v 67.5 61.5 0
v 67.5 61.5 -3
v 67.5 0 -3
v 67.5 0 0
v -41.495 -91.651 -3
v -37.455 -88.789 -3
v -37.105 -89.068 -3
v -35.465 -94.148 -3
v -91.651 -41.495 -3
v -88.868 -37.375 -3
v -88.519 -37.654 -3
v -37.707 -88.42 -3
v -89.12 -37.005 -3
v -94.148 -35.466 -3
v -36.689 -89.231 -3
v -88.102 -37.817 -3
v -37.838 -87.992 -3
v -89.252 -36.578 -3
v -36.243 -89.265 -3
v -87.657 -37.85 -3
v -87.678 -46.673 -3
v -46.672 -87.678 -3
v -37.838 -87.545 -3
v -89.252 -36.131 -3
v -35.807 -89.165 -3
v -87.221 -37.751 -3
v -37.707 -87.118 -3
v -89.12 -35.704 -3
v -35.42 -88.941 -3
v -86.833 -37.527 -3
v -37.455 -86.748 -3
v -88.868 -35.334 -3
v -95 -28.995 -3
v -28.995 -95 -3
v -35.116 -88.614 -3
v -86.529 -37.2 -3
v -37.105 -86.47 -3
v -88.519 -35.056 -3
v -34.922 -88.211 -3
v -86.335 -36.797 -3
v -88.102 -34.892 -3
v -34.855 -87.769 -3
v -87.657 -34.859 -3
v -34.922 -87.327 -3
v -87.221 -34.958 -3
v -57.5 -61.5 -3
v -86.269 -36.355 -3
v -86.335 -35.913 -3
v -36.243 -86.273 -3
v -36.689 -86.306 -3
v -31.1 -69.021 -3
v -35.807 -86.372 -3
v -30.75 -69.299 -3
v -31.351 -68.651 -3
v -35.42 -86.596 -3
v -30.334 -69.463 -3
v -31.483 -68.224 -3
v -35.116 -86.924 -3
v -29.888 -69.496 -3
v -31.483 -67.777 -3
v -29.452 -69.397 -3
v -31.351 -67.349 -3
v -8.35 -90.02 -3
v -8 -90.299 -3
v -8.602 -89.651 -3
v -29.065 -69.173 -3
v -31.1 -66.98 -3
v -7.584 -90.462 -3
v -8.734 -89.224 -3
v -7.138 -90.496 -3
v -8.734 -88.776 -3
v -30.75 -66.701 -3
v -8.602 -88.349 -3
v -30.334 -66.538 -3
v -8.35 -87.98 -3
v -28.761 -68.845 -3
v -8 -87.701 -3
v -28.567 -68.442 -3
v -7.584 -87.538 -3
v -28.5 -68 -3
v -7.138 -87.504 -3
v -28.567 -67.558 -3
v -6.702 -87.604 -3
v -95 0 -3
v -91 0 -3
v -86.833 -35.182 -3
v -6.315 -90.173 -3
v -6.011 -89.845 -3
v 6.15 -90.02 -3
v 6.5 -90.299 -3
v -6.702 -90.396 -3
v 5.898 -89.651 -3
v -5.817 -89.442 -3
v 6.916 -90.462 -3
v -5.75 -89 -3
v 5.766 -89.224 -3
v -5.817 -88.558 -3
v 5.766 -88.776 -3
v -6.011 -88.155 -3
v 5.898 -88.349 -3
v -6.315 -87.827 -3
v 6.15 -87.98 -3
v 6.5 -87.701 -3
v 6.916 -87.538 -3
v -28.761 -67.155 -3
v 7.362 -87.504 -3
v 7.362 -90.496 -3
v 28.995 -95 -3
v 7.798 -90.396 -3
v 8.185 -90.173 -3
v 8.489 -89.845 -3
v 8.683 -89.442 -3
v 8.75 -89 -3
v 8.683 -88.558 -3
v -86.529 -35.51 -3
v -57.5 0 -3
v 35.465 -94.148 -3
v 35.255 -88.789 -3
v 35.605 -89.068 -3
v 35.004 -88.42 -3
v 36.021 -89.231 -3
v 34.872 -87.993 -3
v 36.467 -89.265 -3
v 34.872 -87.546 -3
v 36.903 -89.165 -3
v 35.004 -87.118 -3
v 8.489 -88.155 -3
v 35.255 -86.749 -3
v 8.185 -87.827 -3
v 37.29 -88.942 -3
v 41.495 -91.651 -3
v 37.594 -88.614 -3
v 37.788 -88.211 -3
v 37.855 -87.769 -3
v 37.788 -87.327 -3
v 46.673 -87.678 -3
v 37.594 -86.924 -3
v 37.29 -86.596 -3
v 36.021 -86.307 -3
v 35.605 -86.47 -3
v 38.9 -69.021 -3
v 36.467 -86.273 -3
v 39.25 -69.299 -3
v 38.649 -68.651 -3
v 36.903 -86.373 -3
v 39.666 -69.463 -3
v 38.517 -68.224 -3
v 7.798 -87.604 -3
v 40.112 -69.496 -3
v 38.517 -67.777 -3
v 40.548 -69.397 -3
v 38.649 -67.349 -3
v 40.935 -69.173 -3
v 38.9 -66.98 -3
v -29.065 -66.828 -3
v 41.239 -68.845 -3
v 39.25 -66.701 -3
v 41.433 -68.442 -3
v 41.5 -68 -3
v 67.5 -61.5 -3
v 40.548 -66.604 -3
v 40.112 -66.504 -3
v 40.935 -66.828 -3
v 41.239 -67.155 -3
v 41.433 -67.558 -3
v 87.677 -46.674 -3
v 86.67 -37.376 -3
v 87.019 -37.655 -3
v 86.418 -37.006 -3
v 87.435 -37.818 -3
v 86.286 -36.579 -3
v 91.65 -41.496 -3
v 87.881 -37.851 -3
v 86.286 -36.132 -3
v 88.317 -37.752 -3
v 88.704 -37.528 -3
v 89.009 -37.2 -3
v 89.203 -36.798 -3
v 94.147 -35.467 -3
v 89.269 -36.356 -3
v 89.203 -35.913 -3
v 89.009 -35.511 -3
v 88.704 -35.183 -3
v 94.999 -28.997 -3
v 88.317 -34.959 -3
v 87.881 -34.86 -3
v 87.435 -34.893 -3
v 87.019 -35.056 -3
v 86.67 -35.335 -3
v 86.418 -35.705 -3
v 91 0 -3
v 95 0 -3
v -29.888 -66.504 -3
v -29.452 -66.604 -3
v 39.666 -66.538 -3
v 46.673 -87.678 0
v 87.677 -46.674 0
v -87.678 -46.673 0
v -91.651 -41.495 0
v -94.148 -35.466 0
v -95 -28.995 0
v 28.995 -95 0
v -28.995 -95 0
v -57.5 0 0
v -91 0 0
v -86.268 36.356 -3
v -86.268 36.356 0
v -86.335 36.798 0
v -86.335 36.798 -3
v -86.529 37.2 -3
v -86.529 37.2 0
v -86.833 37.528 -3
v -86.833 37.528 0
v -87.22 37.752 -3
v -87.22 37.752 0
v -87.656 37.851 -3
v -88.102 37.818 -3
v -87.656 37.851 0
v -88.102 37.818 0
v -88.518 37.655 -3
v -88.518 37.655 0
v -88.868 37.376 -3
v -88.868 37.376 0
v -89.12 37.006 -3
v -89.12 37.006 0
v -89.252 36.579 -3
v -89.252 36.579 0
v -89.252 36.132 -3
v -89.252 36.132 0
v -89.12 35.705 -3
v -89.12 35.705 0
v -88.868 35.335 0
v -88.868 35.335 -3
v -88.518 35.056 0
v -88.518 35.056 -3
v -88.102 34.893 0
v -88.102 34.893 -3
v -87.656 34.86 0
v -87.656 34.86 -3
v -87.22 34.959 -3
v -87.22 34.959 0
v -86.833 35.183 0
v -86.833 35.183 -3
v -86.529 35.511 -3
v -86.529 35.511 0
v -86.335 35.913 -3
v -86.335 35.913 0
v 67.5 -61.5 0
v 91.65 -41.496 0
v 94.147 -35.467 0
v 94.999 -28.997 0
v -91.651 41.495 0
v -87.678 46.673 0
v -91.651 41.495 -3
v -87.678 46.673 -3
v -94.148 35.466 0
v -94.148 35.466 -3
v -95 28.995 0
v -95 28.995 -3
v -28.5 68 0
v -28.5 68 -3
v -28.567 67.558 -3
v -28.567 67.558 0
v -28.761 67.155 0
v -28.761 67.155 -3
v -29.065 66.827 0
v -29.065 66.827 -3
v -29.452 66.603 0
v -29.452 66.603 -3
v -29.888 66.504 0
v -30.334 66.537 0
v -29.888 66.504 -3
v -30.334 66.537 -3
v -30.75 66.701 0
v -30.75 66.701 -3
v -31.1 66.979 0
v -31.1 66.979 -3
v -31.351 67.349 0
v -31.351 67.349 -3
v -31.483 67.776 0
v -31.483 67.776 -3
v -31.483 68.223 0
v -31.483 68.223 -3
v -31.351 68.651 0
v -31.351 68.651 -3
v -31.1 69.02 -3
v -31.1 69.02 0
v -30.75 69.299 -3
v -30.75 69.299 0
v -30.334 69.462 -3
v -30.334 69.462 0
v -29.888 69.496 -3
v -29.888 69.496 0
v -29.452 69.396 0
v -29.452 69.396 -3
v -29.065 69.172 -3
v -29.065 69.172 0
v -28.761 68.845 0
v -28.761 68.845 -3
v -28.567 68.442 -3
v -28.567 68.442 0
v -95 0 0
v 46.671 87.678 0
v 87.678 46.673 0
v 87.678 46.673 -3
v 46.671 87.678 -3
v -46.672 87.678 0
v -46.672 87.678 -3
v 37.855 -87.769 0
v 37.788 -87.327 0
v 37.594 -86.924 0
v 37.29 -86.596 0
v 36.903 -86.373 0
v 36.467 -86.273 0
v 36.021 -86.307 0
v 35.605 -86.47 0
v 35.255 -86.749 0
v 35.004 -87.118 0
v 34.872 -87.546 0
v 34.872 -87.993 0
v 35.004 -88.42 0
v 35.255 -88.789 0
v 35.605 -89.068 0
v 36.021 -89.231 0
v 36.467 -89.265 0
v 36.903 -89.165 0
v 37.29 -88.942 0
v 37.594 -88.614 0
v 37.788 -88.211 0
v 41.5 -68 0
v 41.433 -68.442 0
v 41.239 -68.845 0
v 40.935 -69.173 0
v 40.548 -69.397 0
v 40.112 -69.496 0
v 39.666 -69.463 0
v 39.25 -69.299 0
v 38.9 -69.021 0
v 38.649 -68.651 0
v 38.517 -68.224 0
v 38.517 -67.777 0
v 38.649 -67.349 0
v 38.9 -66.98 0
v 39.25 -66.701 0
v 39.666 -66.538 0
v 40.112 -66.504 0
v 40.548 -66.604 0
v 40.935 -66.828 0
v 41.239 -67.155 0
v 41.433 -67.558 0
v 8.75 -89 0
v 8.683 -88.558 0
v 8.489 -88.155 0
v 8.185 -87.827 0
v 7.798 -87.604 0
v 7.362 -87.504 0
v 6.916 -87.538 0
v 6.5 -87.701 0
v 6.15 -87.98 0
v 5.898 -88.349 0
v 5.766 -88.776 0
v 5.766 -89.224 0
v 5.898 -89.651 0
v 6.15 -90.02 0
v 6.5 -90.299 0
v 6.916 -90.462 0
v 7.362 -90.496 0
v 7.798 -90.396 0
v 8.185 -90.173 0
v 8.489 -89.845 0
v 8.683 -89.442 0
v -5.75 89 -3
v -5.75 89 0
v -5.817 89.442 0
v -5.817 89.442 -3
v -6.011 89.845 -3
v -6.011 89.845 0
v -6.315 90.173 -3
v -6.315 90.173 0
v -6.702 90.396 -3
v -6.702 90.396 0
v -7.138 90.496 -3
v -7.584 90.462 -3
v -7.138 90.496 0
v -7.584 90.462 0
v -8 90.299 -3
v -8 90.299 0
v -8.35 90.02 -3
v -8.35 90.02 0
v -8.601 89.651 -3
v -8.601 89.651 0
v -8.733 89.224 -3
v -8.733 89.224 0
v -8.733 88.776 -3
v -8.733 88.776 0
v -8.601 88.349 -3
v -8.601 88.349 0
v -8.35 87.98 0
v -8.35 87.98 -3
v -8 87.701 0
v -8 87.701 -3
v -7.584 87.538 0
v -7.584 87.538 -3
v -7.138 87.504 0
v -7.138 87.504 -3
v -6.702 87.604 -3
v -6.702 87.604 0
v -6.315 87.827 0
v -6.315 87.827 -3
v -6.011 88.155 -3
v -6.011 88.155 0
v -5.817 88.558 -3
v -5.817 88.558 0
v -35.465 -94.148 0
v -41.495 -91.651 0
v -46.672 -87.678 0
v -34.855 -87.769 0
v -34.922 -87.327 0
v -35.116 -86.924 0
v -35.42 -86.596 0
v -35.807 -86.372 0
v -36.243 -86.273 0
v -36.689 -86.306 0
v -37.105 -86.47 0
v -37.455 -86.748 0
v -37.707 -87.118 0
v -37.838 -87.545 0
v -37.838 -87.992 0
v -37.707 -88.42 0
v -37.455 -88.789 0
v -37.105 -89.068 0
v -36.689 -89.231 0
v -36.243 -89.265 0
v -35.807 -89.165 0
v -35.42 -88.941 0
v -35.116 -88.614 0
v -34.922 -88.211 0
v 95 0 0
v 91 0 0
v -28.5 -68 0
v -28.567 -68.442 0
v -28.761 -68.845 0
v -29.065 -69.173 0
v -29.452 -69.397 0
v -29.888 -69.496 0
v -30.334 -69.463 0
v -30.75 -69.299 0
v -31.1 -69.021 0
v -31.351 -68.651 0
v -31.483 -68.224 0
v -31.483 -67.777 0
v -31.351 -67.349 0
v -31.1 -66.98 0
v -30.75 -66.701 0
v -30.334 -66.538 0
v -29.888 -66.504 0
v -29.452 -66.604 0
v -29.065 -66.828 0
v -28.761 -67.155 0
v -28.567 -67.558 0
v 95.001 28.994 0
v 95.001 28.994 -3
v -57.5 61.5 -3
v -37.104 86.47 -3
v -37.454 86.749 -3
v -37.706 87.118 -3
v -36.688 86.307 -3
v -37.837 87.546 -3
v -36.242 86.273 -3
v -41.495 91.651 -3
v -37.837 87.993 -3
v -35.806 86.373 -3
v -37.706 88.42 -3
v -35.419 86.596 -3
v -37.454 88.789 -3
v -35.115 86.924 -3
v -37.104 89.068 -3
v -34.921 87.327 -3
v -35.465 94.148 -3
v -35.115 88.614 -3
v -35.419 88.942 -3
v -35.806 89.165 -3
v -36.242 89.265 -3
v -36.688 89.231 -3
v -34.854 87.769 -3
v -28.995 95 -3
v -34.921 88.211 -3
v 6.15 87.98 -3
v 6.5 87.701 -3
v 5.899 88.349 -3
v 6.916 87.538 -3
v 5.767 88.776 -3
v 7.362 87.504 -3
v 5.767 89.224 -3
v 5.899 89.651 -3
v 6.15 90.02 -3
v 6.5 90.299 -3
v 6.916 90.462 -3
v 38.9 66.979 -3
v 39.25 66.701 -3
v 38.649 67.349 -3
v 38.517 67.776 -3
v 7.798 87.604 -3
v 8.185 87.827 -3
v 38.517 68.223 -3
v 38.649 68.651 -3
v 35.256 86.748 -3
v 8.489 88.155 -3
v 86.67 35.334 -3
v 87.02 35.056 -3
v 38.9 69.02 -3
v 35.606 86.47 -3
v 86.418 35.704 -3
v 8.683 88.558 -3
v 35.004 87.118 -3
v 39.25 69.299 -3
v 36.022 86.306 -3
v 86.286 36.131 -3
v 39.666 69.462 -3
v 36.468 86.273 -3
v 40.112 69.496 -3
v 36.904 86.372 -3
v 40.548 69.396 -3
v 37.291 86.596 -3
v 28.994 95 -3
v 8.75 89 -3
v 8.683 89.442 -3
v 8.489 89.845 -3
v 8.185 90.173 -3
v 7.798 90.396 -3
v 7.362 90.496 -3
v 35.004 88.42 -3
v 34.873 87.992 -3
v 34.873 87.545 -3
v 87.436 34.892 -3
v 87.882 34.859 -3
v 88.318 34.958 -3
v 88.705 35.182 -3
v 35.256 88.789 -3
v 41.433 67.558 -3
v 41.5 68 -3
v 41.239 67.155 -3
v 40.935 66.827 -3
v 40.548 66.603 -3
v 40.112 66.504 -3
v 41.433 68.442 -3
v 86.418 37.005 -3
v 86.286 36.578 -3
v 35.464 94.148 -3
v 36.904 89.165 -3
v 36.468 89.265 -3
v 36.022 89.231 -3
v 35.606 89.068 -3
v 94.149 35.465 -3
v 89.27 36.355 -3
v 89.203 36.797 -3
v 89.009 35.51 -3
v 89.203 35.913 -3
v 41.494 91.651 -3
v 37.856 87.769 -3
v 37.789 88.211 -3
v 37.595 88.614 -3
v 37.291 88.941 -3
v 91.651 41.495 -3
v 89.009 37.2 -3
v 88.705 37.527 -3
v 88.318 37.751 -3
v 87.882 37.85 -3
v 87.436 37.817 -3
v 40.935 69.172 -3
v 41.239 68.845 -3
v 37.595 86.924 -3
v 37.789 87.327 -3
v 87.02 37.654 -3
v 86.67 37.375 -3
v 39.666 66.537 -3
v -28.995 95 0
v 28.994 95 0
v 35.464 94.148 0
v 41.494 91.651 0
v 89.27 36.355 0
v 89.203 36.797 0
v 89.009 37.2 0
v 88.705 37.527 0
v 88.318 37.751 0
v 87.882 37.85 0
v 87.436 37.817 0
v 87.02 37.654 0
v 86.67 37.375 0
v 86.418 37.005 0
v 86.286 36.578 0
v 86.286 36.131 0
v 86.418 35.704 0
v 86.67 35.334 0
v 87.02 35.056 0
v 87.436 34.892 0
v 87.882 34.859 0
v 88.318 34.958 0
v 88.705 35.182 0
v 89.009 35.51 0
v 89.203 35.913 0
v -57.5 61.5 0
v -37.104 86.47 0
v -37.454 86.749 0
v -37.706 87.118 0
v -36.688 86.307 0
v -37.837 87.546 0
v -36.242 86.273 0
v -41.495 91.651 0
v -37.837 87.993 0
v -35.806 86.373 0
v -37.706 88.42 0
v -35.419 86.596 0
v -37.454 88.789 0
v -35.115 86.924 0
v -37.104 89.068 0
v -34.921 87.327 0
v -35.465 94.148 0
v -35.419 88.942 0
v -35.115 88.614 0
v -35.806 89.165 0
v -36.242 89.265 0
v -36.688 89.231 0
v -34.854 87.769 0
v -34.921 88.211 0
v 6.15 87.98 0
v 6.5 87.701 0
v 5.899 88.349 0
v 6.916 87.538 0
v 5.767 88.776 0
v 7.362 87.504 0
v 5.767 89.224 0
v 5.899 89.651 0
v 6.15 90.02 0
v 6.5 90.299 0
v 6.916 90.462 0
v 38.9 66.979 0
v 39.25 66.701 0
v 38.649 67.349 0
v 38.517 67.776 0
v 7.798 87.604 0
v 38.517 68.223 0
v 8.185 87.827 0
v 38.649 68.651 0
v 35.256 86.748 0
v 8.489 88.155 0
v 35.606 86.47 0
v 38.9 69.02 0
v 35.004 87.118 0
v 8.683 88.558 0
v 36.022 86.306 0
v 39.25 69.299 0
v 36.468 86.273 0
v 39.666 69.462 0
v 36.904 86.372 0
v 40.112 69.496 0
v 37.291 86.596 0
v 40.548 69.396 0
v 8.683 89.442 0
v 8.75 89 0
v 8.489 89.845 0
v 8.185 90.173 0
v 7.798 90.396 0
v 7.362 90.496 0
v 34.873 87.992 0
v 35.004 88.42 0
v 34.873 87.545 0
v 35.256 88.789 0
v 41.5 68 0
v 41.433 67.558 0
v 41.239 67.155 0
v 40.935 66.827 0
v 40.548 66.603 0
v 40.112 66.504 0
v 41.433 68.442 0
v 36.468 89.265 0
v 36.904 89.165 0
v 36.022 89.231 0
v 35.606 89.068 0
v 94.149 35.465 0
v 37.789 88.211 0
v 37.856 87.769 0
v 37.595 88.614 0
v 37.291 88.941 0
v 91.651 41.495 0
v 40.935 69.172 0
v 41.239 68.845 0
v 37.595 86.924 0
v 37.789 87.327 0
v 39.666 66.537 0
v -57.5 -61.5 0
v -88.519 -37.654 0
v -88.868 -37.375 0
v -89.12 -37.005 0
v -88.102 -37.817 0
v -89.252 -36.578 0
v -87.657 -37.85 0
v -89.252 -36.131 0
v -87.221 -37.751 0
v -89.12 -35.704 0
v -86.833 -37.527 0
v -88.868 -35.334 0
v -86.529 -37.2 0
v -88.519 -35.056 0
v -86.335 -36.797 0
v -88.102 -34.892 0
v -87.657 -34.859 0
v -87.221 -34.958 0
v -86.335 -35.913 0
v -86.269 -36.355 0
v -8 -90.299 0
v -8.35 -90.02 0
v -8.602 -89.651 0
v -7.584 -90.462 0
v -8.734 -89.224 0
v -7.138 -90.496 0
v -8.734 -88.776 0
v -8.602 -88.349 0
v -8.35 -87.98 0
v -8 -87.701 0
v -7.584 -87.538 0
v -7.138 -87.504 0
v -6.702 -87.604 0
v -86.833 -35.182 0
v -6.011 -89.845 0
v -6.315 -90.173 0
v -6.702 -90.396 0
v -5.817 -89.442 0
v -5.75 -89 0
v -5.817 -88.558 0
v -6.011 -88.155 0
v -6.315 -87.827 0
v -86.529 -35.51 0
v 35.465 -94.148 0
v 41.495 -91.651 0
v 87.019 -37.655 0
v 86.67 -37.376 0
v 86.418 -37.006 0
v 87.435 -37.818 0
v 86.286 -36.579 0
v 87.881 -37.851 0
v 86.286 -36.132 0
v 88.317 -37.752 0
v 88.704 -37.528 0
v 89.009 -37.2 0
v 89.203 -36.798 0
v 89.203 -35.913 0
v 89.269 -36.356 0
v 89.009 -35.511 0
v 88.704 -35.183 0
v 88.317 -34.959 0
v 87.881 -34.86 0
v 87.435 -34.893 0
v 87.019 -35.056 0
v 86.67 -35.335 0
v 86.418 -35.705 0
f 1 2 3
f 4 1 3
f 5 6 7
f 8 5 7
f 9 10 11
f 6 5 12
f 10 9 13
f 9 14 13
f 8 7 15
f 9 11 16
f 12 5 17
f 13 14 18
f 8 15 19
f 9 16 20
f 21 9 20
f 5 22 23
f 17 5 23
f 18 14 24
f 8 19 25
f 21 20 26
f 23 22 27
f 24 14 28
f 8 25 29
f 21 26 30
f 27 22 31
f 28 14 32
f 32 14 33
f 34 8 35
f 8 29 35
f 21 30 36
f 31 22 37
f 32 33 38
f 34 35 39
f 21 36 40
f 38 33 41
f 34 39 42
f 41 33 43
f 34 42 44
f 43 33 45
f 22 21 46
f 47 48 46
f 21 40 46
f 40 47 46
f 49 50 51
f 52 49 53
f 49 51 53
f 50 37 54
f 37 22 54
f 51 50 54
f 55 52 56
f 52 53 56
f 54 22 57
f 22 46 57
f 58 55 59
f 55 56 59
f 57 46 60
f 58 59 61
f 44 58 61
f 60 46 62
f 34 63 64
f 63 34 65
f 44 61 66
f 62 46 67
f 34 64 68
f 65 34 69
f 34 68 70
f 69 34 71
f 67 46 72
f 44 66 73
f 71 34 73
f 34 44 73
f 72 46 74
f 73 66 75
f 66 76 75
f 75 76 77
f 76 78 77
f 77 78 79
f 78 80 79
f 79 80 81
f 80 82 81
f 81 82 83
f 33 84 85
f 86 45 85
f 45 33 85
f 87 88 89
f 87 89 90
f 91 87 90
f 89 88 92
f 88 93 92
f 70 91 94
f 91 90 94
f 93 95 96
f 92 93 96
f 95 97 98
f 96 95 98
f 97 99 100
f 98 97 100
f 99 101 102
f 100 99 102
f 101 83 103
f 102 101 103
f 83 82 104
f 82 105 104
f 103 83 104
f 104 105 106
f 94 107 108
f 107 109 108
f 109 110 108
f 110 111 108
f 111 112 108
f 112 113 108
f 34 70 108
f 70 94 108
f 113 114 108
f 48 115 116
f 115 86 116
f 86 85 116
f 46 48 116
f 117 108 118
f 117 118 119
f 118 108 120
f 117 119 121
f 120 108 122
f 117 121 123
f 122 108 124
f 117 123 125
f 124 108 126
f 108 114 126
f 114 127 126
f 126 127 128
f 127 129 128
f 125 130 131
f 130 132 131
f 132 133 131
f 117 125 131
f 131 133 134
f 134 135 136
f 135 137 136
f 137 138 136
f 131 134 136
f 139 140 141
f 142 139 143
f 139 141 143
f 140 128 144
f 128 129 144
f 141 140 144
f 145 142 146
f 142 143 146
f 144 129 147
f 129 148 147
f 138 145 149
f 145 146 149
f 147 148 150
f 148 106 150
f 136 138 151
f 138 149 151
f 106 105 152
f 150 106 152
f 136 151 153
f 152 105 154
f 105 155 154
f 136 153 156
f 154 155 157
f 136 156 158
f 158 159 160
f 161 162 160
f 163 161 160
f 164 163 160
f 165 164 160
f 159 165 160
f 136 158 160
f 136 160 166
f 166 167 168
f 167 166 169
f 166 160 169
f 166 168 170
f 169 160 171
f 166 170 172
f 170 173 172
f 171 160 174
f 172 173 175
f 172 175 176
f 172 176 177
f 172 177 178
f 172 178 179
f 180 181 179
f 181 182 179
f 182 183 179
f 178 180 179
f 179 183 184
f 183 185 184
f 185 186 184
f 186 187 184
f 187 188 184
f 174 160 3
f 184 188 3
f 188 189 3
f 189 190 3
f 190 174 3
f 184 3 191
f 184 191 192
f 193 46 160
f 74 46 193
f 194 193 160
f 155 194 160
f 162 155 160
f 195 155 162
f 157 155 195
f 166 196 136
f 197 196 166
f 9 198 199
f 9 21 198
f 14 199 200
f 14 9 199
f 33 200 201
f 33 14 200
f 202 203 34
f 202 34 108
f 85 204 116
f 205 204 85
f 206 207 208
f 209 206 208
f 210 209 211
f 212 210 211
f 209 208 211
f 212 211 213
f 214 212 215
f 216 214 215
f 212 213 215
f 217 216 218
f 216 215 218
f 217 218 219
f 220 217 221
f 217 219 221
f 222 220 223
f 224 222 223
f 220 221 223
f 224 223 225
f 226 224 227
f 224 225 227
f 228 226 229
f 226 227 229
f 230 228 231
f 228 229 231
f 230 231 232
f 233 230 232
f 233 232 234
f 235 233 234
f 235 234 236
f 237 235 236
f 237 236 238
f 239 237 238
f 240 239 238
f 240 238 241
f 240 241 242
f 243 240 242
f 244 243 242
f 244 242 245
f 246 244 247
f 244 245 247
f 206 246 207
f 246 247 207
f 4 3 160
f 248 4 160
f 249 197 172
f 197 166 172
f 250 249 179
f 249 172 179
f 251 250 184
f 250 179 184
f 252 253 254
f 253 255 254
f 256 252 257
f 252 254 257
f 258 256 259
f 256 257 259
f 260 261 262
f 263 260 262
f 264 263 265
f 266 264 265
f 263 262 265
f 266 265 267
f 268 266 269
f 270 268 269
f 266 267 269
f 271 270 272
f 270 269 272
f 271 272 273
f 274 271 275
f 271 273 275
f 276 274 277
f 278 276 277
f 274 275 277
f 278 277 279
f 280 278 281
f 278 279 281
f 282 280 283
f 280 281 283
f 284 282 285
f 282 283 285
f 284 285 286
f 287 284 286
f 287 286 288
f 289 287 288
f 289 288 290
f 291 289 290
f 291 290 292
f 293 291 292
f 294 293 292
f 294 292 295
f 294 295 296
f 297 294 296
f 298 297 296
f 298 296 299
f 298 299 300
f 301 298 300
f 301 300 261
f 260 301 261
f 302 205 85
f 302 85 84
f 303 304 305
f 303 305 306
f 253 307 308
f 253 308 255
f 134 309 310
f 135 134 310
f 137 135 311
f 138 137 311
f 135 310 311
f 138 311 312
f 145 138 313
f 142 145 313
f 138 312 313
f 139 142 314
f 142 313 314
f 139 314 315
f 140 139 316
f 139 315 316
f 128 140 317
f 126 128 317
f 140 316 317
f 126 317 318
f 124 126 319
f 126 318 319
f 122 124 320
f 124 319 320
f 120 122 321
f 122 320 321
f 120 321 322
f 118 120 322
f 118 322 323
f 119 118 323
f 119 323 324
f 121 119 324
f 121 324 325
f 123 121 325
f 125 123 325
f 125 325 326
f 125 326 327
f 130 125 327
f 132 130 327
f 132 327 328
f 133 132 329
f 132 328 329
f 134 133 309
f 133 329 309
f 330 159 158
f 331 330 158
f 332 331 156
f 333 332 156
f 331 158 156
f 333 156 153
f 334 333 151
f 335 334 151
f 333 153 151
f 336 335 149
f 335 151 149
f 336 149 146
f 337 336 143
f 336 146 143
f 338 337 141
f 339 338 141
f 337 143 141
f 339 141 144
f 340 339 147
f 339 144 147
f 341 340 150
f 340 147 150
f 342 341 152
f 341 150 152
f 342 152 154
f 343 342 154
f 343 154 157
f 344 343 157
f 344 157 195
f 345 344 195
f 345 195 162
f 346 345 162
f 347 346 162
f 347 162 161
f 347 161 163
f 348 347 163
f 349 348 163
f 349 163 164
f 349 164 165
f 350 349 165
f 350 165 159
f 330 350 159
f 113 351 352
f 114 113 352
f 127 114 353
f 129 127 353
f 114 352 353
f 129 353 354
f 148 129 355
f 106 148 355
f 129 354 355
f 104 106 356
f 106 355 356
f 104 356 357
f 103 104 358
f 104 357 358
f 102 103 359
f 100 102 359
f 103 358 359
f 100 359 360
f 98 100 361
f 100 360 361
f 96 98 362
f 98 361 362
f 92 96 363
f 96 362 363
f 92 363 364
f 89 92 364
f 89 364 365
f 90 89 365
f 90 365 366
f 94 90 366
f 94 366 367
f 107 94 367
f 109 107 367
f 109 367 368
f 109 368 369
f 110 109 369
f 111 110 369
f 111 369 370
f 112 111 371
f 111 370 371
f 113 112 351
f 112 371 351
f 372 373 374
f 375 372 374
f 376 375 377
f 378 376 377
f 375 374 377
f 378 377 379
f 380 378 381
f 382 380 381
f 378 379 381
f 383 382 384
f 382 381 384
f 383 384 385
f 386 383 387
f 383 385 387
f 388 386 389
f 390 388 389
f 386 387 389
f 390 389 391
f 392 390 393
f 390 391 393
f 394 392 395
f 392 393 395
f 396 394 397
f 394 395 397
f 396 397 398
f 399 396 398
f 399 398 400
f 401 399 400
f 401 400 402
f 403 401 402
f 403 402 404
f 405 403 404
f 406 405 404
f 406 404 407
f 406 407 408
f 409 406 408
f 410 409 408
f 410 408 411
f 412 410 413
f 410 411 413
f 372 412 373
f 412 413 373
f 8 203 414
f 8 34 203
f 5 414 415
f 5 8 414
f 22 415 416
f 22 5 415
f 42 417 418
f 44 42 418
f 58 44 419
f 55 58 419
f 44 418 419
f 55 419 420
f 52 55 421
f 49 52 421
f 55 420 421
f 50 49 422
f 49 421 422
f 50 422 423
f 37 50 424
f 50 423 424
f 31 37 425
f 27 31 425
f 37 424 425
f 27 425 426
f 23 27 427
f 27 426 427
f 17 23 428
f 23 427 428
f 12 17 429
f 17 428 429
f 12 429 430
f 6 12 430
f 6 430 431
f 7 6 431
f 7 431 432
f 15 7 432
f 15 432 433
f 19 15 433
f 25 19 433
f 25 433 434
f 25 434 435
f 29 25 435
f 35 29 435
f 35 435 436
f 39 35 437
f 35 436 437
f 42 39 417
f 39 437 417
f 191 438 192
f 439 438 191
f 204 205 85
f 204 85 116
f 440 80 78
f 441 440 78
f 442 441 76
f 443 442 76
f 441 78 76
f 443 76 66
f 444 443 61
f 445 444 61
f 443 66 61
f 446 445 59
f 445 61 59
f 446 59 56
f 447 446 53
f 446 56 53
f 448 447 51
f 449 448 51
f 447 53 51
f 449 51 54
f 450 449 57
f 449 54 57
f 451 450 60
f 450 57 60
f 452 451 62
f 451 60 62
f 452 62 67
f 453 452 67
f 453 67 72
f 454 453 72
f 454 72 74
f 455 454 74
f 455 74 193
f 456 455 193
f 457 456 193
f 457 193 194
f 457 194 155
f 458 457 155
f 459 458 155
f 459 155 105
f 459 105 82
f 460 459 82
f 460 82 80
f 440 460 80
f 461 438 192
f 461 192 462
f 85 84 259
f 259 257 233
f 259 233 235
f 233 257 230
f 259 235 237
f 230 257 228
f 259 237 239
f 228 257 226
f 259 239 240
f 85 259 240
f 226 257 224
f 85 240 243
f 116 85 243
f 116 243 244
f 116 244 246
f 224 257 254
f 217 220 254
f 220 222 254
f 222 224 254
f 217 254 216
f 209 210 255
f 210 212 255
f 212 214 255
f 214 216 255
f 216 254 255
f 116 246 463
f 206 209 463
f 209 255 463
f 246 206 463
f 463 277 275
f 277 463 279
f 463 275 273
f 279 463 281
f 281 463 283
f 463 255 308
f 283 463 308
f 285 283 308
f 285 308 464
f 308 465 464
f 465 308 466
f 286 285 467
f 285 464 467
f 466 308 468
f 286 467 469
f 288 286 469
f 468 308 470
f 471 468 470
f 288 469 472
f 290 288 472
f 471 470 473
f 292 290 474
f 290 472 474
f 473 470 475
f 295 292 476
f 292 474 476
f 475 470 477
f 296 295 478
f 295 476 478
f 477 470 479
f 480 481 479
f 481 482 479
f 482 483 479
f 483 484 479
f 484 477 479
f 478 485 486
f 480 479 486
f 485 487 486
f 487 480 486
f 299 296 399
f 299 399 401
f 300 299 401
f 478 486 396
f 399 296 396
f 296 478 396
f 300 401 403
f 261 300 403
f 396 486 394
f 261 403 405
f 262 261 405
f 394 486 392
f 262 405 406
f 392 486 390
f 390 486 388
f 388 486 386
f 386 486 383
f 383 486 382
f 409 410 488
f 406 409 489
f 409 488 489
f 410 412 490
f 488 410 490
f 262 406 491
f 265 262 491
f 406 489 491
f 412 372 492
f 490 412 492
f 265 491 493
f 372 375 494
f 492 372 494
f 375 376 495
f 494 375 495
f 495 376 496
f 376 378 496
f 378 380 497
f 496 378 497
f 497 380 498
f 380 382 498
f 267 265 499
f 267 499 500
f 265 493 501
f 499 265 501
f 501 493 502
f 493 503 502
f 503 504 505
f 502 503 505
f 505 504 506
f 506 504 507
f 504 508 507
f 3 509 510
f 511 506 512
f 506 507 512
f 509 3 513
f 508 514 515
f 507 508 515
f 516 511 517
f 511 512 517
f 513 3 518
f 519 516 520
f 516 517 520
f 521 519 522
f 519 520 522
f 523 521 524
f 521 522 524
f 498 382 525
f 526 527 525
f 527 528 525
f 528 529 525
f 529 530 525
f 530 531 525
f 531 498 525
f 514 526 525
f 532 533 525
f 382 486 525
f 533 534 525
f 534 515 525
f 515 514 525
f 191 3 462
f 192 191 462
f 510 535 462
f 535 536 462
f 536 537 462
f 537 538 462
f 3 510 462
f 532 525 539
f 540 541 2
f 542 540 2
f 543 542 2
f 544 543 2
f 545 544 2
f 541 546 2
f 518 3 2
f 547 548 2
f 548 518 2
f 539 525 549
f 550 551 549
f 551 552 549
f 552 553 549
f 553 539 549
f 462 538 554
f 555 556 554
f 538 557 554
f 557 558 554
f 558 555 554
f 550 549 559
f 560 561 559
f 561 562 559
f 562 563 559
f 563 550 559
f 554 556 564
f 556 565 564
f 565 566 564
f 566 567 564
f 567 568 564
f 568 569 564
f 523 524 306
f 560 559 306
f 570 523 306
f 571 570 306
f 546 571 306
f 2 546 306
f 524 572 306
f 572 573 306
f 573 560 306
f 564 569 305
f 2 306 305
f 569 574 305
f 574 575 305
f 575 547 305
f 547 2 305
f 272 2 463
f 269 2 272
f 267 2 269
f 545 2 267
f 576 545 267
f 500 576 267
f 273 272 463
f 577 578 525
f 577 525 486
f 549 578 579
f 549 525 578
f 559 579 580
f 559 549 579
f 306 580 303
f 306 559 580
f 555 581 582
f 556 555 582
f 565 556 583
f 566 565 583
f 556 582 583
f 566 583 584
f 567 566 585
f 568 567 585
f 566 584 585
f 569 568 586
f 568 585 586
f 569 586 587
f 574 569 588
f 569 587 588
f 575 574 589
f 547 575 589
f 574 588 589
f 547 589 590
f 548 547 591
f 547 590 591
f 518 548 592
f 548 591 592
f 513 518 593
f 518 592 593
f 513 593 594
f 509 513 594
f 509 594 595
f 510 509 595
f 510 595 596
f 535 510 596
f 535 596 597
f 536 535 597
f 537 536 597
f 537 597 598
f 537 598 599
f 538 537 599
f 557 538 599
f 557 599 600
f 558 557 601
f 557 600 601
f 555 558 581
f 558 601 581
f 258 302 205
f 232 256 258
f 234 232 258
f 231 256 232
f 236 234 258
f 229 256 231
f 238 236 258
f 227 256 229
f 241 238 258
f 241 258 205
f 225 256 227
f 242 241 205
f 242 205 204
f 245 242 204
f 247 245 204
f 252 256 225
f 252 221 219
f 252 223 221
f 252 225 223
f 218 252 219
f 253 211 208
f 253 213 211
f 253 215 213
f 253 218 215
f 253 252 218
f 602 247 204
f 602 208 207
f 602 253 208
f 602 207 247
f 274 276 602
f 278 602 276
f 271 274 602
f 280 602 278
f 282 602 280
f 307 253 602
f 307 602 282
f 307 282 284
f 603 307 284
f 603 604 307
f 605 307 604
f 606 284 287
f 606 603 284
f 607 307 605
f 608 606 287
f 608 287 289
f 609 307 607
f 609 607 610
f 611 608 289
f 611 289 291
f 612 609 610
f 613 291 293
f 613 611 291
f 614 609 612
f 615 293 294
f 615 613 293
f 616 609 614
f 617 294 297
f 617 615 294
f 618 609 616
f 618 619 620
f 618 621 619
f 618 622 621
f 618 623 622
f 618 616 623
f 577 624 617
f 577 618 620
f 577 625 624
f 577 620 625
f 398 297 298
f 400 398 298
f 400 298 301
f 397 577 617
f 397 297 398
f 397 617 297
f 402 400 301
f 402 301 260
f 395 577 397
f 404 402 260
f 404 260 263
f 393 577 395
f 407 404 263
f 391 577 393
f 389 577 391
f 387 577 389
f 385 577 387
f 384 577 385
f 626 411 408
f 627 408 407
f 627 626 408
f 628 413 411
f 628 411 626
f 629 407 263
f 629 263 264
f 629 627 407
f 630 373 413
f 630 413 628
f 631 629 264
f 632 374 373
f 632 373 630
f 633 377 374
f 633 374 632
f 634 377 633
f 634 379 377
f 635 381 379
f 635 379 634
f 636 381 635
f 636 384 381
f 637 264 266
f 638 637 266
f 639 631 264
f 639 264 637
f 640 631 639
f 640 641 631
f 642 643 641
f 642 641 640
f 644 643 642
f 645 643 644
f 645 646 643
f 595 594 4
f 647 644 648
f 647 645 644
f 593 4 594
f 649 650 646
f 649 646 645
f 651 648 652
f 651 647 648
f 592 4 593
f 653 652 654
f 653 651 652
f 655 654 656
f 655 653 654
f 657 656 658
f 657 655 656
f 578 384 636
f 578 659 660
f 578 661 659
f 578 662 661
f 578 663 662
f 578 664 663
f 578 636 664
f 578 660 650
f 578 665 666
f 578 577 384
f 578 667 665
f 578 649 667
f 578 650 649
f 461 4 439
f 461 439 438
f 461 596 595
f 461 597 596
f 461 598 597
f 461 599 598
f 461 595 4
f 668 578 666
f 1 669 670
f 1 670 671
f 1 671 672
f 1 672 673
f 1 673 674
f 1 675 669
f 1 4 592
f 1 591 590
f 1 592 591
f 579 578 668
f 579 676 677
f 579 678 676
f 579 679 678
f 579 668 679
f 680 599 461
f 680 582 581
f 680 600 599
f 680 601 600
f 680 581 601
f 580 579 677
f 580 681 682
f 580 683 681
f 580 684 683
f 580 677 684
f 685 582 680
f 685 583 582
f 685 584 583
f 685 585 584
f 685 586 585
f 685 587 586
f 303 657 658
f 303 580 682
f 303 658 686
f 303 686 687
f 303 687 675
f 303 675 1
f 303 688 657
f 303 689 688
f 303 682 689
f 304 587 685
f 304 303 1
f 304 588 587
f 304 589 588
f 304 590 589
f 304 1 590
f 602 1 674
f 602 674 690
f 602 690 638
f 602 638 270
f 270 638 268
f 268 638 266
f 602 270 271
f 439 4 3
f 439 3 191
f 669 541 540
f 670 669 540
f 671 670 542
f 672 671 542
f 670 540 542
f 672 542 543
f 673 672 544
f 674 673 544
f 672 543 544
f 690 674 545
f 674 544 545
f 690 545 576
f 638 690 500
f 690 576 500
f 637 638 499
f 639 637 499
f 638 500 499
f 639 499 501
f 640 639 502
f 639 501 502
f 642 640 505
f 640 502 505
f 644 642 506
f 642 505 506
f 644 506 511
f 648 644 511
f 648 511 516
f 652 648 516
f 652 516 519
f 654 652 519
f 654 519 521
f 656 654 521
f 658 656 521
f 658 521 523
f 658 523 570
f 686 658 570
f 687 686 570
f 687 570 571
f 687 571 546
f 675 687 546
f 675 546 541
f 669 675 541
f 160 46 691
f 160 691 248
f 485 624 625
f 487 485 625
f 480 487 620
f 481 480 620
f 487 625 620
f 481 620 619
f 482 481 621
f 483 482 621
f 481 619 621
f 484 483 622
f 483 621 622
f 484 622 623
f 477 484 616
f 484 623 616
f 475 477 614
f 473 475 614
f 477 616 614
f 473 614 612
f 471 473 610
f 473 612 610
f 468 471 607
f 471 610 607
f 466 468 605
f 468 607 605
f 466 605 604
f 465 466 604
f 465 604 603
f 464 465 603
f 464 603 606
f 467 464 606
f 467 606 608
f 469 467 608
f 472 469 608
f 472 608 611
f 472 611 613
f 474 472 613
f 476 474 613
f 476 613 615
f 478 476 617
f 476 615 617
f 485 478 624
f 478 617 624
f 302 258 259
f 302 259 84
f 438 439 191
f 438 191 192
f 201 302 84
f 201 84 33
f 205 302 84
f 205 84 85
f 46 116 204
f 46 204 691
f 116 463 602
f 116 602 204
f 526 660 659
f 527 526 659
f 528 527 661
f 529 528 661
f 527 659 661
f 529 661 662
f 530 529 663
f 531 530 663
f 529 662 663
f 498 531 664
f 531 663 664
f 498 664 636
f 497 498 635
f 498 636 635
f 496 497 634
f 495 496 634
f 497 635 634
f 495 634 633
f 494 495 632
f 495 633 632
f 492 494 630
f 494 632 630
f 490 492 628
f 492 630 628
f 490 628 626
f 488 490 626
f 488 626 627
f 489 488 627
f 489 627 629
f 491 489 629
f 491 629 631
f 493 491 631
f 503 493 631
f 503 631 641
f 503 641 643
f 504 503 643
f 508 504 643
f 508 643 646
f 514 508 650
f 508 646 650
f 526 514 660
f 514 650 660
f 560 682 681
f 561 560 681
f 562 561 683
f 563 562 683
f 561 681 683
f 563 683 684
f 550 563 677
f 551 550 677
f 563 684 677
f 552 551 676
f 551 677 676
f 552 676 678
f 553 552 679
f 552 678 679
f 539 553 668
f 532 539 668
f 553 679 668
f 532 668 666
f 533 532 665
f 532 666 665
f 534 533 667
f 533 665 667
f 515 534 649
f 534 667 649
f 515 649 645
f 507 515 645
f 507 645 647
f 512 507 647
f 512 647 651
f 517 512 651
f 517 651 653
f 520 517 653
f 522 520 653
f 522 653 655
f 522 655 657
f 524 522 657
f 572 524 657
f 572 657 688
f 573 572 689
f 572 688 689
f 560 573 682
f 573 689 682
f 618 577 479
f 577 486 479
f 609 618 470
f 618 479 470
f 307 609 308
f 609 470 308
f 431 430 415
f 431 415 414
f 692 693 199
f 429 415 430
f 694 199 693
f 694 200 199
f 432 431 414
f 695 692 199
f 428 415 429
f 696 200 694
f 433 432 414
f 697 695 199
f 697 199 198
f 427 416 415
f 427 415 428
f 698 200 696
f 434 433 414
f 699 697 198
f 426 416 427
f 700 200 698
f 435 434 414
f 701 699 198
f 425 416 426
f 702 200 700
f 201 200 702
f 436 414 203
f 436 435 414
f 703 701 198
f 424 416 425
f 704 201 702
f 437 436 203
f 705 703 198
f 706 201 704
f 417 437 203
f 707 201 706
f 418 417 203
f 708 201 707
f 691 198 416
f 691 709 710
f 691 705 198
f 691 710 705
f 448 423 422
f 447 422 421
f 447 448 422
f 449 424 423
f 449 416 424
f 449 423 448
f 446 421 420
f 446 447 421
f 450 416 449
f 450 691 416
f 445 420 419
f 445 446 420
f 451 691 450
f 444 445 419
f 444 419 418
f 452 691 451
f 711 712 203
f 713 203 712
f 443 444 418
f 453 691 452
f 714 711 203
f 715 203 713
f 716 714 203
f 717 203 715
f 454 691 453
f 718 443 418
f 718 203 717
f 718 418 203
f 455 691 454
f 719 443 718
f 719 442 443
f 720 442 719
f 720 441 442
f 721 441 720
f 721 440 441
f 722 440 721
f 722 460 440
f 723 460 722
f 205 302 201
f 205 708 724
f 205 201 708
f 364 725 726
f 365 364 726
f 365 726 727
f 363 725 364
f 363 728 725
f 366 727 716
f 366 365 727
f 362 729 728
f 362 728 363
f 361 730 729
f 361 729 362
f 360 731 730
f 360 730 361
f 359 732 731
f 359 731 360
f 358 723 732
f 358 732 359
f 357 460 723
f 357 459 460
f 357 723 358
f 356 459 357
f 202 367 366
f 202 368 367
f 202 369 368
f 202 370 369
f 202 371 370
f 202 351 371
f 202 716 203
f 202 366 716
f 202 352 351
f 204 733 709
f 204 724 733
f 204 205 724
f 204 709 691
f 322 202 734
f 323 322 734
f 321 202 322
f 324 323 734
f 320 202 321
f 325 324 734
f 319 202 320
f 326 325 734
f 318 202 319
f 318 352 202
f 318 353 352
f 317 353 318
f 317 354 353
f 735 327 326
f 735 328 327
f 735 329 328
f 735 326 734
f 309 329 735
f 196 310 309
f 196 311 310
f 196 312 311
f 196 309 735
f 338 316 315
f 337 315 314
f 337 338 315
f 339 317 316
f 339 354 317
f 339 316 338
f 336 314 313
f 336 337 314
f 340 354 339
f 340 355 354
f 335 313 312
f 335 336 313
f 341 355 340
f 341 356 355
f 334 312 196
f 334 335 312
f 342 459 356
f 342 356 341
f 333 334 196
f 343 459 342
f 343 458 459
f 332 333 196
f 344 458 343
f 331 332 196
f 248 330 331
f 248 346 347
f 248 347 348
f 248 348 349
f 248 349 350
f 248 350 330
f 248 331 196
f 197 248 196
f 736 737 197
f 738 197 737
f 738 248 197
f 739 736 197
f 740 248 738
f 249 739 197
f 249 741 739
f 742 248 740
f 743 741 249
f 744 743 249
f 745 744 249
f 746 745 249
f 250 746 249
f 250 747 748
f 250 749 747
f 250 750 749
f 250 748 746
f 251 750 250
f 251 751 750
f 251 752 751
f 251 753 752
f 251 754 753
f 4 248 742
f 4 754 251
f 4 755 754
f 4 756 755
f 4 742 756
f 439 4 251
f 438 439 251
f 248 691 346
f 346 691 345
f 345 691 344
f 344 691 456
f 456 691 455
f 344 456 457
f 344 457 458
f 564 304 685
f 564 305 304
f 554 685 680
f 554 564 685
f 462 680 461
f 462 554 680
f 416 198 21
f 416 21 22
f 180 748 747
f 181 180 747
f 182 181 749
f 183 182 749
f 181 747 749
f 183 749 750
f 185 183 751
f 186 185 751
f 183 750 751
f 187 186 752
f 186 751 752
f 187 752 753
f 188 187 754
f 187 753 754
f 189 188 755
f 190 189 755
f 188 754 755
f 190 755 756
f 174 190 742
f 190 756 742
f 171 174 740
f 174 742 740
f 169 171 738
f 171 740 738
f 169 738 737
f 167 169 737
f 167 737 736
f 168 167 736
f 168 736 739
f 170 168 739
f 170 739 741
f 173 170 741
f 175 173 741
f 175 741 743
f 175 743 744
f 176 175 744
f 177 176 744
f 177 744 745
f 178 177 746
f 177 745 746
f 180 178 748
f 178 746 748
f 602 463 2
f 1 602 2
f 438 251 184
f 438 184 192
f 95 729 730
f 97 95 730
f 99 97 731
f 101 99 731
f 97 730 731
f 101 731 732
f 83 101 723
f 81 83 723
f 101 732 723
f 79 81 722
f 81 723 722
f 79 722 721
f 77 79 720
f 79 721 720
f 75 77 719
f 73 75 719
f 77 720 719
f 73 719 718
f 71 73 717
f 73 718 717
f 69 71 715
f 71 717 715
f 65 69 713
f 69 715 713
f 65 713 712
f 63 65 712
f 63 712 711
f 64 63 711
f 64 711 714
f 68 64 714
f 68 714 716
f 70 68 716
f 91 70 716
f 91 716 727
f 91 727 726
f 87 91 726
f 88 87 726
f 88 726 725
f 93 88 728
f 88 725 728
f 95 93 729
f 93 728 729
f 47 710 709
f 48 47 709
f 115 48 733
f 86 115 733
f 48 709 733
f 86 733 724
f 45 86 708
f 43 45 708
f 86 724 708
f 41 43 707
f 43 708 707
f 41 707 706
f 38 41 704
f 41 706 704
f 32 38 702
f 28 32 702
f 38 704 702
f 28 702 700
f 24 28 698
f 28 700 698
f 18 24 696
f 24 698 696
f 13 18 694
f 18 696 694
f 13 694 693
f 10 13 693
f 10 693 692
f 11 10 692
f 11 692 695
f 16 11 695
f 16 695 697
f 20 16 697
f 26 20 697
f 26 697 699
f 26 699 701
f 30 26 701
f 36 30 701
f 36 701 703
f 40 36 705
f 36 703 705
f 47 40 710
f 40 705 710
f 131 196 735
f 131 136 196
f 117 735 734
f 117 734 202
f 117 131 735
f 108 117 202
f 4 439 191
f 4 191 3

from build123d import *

# Parameters (mm, degrees)
F0_R     = 1.5
F1_DEPTH = 3
F2_DEPTH = 3
F3_R     = 1.5
F3_W     = 125
F3_H     = 123
F4_DEPTH = 25
F5_R     = 25
F5_2_R   = 25


with BuildPart() as f1:
    # F0 (on Top) → F1 (new body)
    with BuildSketch(Plane.XY):
        with BuildLine():
            ThreePointArc((0, 89), (-0.6973463578, 89.9599418783), (-1.2683625187, 91))
            Line((-1.2683625187, 91), (-15.7683625187, 91))
            ThreePointArc((-15.7683625187, 91), (-8.4341392949, 85.6640311627), (0, 89))
        make_face()
        with Locations((-7.25, 89)):
            Circle(F0_R, mode=Mode.SUBTRACT)
        with BuildLine():
            Line((15.7683625187, 91), (1.2683625187, 91))
            ThreePointArc((1.2683625187, 91), (0.6973463578, 89.9599418783), (0, 89))
            ThreePointArc((0, 89), (8.4341392949, 85.6640311627), (15.7683625187, 91))
        make_face()
        with Locations((7.25, 89)):
            Circle(F0_R, mode=Mode.SUBTRACT)
        with BuildLine():
            Line((1.2683625187, 91), (-0.000574854, 91))
            Line((-0.000574854, 91), (0, 89))
            ThreePointArc((0, 89), (0.6973463578, 89.9599418783), (1.2683625187, 91))
        make_face()
        with BuildLine():
            Line((0, 89), (-0.000574854, 91))
            Line((-0.000574854, 91), (-1.2683625187, 91))
            ThreePointArc((-1.2683625187, 91), (-0.6973463578, 89.9599418783), (0, 89))
        make_face()
        with BuildLine():
            Line((-91, 37.6936723133), (-91, 28.0082585))
            ThreePointArc((-91, 28.0082585), (-83.8880424277, 34.7482164852), (-84.1505981222, 44.5430129946))
            Line((-84.1505981222, 44.5430129946), (-91, 37.6936723133))
        make_face()
        with Locations((-87.7683096221, 36.3555198846)):
            Circle(F0_R, mode=Mode.SUBTRACT)
        with BuildLine():
            Line((-91, 28.0082585), (-91, -1.00187e-05))
            Line((-91, -1.00187e-05), (91.0000000281, -0.0004658706))
            Line((91.0000000281, -0.0004658706), (91.0008543633, 28.0070940869))
            ThreePointArc((91.0008543633, 28.0070940869), (83.8892324192, 34.747406207), (84.1522758499, 44.5421896302))
            Line((84.1522758499, 44.5421896302), (44.5420451533, 84.150357852))
            ThreePointArc((44.5420451533, 84.150357852), (34.748138544, 83.8886788641), (28.008836335, 91))
            Line((28.008836335, 91), (15.7683625187, 91))
            ThreePointArc((15.7683625187, 91), (8.4341392949, 85.6640311627), (0, 89))
            ThreePointArc((0, 89), (-8.4341392949, 85.6640311627), (-15.7683625187, 91))
            Line((-15.7683625187, 91), (-28.0068175825, 91))
            ThreePointArc((-28.0068175825, 91), (-34.7470657033, 83.8887693351), (-44.5415231064, 84.1517341196))
            Line((-44.5415231064, 84.1517341196), (-84.1505981222, 44.5430129946))
            ThreePointArc((-84.1505981222, 44.5430129946), (-83.8880424277, 34.7482164852), (-91, 28.0082585))
        make_face()
        with BuildLine():
            Line((-37.6931960391, 91), (-44.5415231064, 84.1517341196))
            ThreePointArc((-44.5415231064, 84.1517341196), (-34.7470657033, 83.8887693351), (-28.0068175825, 91))
            Line((-28.0068175825, 91), (-37.6931960391, 91))
        make_face()
        with Locations((-36.3542071419, 87.769103613)):
            Circle(F0_R, mode=Mode.SUBTRACT)
        Polygon((-95, 39.3505370304), (-95, 0), (-91, -1.00187e-05), (-91, 28.0082585), (-91, 37.6936723133), (-84.1505981222, 44.5430129946), (-44.5415231064, 84.1517341196), (-37.6931960391, 91), (-28.0068175825, 91), (-15.7683625187, 91), (-1.2683625187, 91), (-0.000574854, 91), (-0.0006001223, 95), (-39.350039821, 95), align=None)
        Polygon((91.0008543633, 28.0070940869), (91.0000000281, -0.0004658706), (95.0000000297, -0.0004758893), (95.0012003826, 39.3505369701), (39.3488395763, 95), (-0.0006001223, 95), (-0.000574854, 91), (1.2683625187, 91), (15.7683625187, 91), (28.008836335, 91), (37.692046331, 91), (44.5420451533, 84.150357852), (84.1522758499, 44.5421896302), (91.0011498402, 37.6936722556), align=None)
        with BuildLine():
            ThreePointArc((84.1522758499, 44.5421896302), (83.8892324192, 34.747406207), (91.0008543633, 28.0070940869))
            Line((91.0008543633, 28.0070940869), (91.0011498402, 37.6936722556))
            Line((91.0011498402, 37.6936722556), (84.1522758499, 44.5421896302))
        make_face()
        with Locations((87.7695307984, 36.3546343199)):
            Circle(F0_R, mode=Mode.SUBTRACT)
        with BuildLine():
            ThreePointArc((28.008836335, 91), (34.748138544, 83.8886788641), (44.5420451533, 84.150357852))
            Line((44.5420451533, 84.150357852), (37.692046331, 91))
            Line((37.692046331, 91), (28.008836335, 91))
        make_face()
        with Locations((36.3559470699, 87.7687368001)):
            Circle(F0_R, mode=Mode.SUBTRACT)
    extrude(amount=-F1_DEPTH)


with BuildPart() as f2:
    # F0 (on Top) → F2 (new body)
    with BuildSketch(Plane.XY):
        with BuildLine():
            ThreePointArc((-84.1514214865, -44.5421896376), (-83.8883780558, -34.7474062144), (-91, -28.0070940943))
            Line((-91, -28.0070940943), (-91, -37.6936723133))
            Line((-91, -37.6936723133), (-84.1514214865, -44.5421896376))
        make_face()
        with Locations((-87.768676435, -36.3546343273)):
            Circle(F0_R, mode=Mode.SUBTRACT)
        with BuildLine():
            Line((90.9988502167, -37.6945839593), (90.9991456674, -28.0088612088))
            ThreePointArc((90.9991456674, -28.0088612088), (83.8886980637, -34.7486962581), (84.1511187188, -44.5423154571))
            Line((84.1511187188, -44.5423154571), (90.9988502167, -37.6945839593))
        make_face()
        with Locations((87.7691639855, -36.3555198919)):
            Circle(F0_R, mode=Mode.SUBTRACT)
        with BuildLine():
            Line((37.693434176, -91), (44.5419192997, -84.1515148763))
            ThreePointArc((44.5419192997, -84.1515148763), (34.747685436, -83.8888665236), (28.0076719484, -91))
            Line((28.0076719484, -91), (37.693434176, -91))
        make_face()
        with Locations((36.3550615053, -87.7691036204)):
            Circle(F0_R, mode=Mode.SUBTRACT)
        with BuildLine():
            ThreePointArc((-0.000287427, -89.0000000674), (0.6970589308, -89.9599419458), (1.2680750917, -91.0000000674))
            Line((1.2680750917, -91), (15.7680750917, -91))
            ThreePointArc((15.7680750917, -91.0000000674), (8.4338518679, -85.6640312302), (-0.000287427, -89.0000000674))
        make_face()
        with Locations((7.249712573, -89.0000000674)):
            Circle(F0_R, mode=Mode.SUBTRACT)
        with BuildLine():
            Line((-15.7686499457, -91), (-1.2686499457, -91))
            ThreePointArc((-1.2686499457, -91.0000000674), (-0.6976337848, -89.9599419458), (-0.000287427, -89.0000000674))
            ThreePointArc((-0.000287427, -89.0000000674), (-8.4344267219, -85.6640312302), (-15.7686499457, -91.0000000674))
        make_face()
        with Locations((-7.250287427, -89.0000000674)):
            Circle(F0_R, mode=Mode.SUBTRACT)
        with BuildLine():
            ThreePointArc((-28.0079819742, -91), (-34.7478759774, -83.8884337109), (-44.5423464609, -84.1509107725))
            Line((-44.5423464609, -84.1509107725), (-37.6931960391, -91))
            Line((-37.6931960391, -91), (-28.0079819742, -91))
        make_face()
        with Locations((-36.3550927066, -87.7687368075)):
            Circle(F0_R, mode=Mode.SUBTRACT)
        with BuildLine():
            Line((-1.2686499457, -91), (0.0001190684, -91))
            Line((0.0001190684, -91), (0.000287427, -91))
            Line((0.000287427, -91.0000000674), (-0.000287427, -89.0000000674))
            ThreePointArc((-0.000287427, -89.0000000674), (-0.6976337848, -89.9599419458), (-1.2686499457, -91.0000000674))
        make_face()
        with BuildLine():
            Line((-0.000287427, -89.0000000674), (0.000287427, -91.0000000674))
            Line((0.000287427, -91), (1.2680750917, -91))
            ThreePointArc((1.2680750917, -91.0000000674), (0.6970589308, -89.9599419458), (-0.000287427, -89.0000000674))
        make_face()
        with BuildLine():
            Line((91.0000000281, -0.0004658706), (-91, -1.00187e-05))
            Line((-91, -1.00187e-05), (-91, -28.0070940943))
            ThreePointArc((-91, -28.0070940943), (-83.8883780558, -34.7474062144), (-84.1514214865, -44.5421896376))
            Line((-84.1514214865, -44.5421896376), (-44.5423464609, -84.1509107725))
            ThreePointArc((-44.5423464609, -84.1509107725), (-34.7478759774, -83.8884337109), (-28.0079819742, -91))
            Line((-28.0079819742, -91), (-15.7686499457, -91))
            ThreePointArc((-15.7686499457, -91.0000000674), (-8.4344267219, -85.6640312302), (-0.000287427, -89.0000000674))
            ThreePointArc((-0.000287427, -89.0000000674), (8.4338518679, -85.6640312302), (15.7680750917, -91.0000000674))
            Line((15.7680750917, -91), (28.0076719484, -91))
            ThreePointArc((28.0076719484, -91), (34.747685436, -83.8888665236), (44.5419192997, -84.1515148763))
            Line((44.5419192997, -84.1515148763), (84.1511187188, -44.5423154571))
            ThreePointArc((84.1511187188, -44.5423154571), (83.8886980637, -34.7486962581), (90.9991456674, -28.0088612088))
            Line((90.9991456674, -28.0088612088), (91.0000000281, -0.0004658706))
        make_face()
        Polygon((0.0001190684, -91), (0.0001243022, -95), (39.3502884254, -95), (94.9987996768, -39.3514887487), (95.0000000297, -0.0004758893), (91.0000000281, -0.0004658706), (90.9991456674, -28.0088612088), (90.9988502167, -37.6945839593), (84.1511187188, -44.5423154571), (44.5419192997, -84.1515148763), (37.693434176, -91), (28.0076719484, -91), (15.7680750917, -91), (1.2680750917, -91), (0.000287427, -91), align=None)
        Polygon((-95, 0), (-95, -39.3505370304), (-39.350039821, -95), (0.0001243022, -95), (0.0001190684, -91), (-1.2686499457, -91), (-15.7686499457, -91), (-28.0079819742, -91), (-37.6931960391, -91), (-44.5423464609, -84.1509107725), (-84.1514214865, -44.5421896376), (-91, -37.6936723133), (-91, -28.0070940943), (-91, -1.00187e-05), align=None)
    extrude(amount=-F2_DEPTH)


with BuildPart() as f4_tool:
    # F3 (on face) → F4 (new body)
    with BuildSketch(Plane(origin=(0, 0, -3), x_dir=(1, 0, 0), z_dir=(0, 0, -1))):
        with Locations((-29.9999999852, 68.000250468)):
            Circle(F3_R)
        with Locations((40.0000000148, 68.000250468)):
            Circle(F3_R)
        with Locations((40.0000000148, -67.999749532)):
            Circle(F3_R)
        with Locations((-29.9999999852, -67.999749532)):
            Circle(F3_R)
        with Locations((5.0000000148, 0.000250468)):
            Rectangle(F3_W, F3_H)
    extrude(amount=-F4_DEPTH)


with BuildPart() as f1_1:
    add(f1.part)

    # F4: cut by f4_tool
    add(f4_tool.part, mode=Mode.SUBTRACT)

    # F5#2
    f5_2_edges = [f1_1.edges().sort_by_distance(p)[0] for p in [
        (-95, 39.350537, -1.5),
        (-39.35004, 95, -1.5),
        (39.34884, 95, -1.5),
        (95.0012, 39.350537, -1.5),
    ]]
    fillet(f5_2_edges, radius=F5_2_R)


with BuildPart() as f2_1:
    add(f2.part)

    # F4: cut by f4_tool
    add(f4_tool.part, mode=Mode.SUBTRACT)

    # F5
    f5_edges = [f2_1.edges().sort_by_distance(p)[0] for p in [
        (39.350288, -95, -1.5),
        (-39.35004, -95, -1.5),
        (-95, -39.350537, -1.5),
        (94.9988, -39.351489, -1.5),
    ]]
    fillet(f5_edges, radius=F5_R)


solid = Compound([f1_1.part, f2_1.part])
